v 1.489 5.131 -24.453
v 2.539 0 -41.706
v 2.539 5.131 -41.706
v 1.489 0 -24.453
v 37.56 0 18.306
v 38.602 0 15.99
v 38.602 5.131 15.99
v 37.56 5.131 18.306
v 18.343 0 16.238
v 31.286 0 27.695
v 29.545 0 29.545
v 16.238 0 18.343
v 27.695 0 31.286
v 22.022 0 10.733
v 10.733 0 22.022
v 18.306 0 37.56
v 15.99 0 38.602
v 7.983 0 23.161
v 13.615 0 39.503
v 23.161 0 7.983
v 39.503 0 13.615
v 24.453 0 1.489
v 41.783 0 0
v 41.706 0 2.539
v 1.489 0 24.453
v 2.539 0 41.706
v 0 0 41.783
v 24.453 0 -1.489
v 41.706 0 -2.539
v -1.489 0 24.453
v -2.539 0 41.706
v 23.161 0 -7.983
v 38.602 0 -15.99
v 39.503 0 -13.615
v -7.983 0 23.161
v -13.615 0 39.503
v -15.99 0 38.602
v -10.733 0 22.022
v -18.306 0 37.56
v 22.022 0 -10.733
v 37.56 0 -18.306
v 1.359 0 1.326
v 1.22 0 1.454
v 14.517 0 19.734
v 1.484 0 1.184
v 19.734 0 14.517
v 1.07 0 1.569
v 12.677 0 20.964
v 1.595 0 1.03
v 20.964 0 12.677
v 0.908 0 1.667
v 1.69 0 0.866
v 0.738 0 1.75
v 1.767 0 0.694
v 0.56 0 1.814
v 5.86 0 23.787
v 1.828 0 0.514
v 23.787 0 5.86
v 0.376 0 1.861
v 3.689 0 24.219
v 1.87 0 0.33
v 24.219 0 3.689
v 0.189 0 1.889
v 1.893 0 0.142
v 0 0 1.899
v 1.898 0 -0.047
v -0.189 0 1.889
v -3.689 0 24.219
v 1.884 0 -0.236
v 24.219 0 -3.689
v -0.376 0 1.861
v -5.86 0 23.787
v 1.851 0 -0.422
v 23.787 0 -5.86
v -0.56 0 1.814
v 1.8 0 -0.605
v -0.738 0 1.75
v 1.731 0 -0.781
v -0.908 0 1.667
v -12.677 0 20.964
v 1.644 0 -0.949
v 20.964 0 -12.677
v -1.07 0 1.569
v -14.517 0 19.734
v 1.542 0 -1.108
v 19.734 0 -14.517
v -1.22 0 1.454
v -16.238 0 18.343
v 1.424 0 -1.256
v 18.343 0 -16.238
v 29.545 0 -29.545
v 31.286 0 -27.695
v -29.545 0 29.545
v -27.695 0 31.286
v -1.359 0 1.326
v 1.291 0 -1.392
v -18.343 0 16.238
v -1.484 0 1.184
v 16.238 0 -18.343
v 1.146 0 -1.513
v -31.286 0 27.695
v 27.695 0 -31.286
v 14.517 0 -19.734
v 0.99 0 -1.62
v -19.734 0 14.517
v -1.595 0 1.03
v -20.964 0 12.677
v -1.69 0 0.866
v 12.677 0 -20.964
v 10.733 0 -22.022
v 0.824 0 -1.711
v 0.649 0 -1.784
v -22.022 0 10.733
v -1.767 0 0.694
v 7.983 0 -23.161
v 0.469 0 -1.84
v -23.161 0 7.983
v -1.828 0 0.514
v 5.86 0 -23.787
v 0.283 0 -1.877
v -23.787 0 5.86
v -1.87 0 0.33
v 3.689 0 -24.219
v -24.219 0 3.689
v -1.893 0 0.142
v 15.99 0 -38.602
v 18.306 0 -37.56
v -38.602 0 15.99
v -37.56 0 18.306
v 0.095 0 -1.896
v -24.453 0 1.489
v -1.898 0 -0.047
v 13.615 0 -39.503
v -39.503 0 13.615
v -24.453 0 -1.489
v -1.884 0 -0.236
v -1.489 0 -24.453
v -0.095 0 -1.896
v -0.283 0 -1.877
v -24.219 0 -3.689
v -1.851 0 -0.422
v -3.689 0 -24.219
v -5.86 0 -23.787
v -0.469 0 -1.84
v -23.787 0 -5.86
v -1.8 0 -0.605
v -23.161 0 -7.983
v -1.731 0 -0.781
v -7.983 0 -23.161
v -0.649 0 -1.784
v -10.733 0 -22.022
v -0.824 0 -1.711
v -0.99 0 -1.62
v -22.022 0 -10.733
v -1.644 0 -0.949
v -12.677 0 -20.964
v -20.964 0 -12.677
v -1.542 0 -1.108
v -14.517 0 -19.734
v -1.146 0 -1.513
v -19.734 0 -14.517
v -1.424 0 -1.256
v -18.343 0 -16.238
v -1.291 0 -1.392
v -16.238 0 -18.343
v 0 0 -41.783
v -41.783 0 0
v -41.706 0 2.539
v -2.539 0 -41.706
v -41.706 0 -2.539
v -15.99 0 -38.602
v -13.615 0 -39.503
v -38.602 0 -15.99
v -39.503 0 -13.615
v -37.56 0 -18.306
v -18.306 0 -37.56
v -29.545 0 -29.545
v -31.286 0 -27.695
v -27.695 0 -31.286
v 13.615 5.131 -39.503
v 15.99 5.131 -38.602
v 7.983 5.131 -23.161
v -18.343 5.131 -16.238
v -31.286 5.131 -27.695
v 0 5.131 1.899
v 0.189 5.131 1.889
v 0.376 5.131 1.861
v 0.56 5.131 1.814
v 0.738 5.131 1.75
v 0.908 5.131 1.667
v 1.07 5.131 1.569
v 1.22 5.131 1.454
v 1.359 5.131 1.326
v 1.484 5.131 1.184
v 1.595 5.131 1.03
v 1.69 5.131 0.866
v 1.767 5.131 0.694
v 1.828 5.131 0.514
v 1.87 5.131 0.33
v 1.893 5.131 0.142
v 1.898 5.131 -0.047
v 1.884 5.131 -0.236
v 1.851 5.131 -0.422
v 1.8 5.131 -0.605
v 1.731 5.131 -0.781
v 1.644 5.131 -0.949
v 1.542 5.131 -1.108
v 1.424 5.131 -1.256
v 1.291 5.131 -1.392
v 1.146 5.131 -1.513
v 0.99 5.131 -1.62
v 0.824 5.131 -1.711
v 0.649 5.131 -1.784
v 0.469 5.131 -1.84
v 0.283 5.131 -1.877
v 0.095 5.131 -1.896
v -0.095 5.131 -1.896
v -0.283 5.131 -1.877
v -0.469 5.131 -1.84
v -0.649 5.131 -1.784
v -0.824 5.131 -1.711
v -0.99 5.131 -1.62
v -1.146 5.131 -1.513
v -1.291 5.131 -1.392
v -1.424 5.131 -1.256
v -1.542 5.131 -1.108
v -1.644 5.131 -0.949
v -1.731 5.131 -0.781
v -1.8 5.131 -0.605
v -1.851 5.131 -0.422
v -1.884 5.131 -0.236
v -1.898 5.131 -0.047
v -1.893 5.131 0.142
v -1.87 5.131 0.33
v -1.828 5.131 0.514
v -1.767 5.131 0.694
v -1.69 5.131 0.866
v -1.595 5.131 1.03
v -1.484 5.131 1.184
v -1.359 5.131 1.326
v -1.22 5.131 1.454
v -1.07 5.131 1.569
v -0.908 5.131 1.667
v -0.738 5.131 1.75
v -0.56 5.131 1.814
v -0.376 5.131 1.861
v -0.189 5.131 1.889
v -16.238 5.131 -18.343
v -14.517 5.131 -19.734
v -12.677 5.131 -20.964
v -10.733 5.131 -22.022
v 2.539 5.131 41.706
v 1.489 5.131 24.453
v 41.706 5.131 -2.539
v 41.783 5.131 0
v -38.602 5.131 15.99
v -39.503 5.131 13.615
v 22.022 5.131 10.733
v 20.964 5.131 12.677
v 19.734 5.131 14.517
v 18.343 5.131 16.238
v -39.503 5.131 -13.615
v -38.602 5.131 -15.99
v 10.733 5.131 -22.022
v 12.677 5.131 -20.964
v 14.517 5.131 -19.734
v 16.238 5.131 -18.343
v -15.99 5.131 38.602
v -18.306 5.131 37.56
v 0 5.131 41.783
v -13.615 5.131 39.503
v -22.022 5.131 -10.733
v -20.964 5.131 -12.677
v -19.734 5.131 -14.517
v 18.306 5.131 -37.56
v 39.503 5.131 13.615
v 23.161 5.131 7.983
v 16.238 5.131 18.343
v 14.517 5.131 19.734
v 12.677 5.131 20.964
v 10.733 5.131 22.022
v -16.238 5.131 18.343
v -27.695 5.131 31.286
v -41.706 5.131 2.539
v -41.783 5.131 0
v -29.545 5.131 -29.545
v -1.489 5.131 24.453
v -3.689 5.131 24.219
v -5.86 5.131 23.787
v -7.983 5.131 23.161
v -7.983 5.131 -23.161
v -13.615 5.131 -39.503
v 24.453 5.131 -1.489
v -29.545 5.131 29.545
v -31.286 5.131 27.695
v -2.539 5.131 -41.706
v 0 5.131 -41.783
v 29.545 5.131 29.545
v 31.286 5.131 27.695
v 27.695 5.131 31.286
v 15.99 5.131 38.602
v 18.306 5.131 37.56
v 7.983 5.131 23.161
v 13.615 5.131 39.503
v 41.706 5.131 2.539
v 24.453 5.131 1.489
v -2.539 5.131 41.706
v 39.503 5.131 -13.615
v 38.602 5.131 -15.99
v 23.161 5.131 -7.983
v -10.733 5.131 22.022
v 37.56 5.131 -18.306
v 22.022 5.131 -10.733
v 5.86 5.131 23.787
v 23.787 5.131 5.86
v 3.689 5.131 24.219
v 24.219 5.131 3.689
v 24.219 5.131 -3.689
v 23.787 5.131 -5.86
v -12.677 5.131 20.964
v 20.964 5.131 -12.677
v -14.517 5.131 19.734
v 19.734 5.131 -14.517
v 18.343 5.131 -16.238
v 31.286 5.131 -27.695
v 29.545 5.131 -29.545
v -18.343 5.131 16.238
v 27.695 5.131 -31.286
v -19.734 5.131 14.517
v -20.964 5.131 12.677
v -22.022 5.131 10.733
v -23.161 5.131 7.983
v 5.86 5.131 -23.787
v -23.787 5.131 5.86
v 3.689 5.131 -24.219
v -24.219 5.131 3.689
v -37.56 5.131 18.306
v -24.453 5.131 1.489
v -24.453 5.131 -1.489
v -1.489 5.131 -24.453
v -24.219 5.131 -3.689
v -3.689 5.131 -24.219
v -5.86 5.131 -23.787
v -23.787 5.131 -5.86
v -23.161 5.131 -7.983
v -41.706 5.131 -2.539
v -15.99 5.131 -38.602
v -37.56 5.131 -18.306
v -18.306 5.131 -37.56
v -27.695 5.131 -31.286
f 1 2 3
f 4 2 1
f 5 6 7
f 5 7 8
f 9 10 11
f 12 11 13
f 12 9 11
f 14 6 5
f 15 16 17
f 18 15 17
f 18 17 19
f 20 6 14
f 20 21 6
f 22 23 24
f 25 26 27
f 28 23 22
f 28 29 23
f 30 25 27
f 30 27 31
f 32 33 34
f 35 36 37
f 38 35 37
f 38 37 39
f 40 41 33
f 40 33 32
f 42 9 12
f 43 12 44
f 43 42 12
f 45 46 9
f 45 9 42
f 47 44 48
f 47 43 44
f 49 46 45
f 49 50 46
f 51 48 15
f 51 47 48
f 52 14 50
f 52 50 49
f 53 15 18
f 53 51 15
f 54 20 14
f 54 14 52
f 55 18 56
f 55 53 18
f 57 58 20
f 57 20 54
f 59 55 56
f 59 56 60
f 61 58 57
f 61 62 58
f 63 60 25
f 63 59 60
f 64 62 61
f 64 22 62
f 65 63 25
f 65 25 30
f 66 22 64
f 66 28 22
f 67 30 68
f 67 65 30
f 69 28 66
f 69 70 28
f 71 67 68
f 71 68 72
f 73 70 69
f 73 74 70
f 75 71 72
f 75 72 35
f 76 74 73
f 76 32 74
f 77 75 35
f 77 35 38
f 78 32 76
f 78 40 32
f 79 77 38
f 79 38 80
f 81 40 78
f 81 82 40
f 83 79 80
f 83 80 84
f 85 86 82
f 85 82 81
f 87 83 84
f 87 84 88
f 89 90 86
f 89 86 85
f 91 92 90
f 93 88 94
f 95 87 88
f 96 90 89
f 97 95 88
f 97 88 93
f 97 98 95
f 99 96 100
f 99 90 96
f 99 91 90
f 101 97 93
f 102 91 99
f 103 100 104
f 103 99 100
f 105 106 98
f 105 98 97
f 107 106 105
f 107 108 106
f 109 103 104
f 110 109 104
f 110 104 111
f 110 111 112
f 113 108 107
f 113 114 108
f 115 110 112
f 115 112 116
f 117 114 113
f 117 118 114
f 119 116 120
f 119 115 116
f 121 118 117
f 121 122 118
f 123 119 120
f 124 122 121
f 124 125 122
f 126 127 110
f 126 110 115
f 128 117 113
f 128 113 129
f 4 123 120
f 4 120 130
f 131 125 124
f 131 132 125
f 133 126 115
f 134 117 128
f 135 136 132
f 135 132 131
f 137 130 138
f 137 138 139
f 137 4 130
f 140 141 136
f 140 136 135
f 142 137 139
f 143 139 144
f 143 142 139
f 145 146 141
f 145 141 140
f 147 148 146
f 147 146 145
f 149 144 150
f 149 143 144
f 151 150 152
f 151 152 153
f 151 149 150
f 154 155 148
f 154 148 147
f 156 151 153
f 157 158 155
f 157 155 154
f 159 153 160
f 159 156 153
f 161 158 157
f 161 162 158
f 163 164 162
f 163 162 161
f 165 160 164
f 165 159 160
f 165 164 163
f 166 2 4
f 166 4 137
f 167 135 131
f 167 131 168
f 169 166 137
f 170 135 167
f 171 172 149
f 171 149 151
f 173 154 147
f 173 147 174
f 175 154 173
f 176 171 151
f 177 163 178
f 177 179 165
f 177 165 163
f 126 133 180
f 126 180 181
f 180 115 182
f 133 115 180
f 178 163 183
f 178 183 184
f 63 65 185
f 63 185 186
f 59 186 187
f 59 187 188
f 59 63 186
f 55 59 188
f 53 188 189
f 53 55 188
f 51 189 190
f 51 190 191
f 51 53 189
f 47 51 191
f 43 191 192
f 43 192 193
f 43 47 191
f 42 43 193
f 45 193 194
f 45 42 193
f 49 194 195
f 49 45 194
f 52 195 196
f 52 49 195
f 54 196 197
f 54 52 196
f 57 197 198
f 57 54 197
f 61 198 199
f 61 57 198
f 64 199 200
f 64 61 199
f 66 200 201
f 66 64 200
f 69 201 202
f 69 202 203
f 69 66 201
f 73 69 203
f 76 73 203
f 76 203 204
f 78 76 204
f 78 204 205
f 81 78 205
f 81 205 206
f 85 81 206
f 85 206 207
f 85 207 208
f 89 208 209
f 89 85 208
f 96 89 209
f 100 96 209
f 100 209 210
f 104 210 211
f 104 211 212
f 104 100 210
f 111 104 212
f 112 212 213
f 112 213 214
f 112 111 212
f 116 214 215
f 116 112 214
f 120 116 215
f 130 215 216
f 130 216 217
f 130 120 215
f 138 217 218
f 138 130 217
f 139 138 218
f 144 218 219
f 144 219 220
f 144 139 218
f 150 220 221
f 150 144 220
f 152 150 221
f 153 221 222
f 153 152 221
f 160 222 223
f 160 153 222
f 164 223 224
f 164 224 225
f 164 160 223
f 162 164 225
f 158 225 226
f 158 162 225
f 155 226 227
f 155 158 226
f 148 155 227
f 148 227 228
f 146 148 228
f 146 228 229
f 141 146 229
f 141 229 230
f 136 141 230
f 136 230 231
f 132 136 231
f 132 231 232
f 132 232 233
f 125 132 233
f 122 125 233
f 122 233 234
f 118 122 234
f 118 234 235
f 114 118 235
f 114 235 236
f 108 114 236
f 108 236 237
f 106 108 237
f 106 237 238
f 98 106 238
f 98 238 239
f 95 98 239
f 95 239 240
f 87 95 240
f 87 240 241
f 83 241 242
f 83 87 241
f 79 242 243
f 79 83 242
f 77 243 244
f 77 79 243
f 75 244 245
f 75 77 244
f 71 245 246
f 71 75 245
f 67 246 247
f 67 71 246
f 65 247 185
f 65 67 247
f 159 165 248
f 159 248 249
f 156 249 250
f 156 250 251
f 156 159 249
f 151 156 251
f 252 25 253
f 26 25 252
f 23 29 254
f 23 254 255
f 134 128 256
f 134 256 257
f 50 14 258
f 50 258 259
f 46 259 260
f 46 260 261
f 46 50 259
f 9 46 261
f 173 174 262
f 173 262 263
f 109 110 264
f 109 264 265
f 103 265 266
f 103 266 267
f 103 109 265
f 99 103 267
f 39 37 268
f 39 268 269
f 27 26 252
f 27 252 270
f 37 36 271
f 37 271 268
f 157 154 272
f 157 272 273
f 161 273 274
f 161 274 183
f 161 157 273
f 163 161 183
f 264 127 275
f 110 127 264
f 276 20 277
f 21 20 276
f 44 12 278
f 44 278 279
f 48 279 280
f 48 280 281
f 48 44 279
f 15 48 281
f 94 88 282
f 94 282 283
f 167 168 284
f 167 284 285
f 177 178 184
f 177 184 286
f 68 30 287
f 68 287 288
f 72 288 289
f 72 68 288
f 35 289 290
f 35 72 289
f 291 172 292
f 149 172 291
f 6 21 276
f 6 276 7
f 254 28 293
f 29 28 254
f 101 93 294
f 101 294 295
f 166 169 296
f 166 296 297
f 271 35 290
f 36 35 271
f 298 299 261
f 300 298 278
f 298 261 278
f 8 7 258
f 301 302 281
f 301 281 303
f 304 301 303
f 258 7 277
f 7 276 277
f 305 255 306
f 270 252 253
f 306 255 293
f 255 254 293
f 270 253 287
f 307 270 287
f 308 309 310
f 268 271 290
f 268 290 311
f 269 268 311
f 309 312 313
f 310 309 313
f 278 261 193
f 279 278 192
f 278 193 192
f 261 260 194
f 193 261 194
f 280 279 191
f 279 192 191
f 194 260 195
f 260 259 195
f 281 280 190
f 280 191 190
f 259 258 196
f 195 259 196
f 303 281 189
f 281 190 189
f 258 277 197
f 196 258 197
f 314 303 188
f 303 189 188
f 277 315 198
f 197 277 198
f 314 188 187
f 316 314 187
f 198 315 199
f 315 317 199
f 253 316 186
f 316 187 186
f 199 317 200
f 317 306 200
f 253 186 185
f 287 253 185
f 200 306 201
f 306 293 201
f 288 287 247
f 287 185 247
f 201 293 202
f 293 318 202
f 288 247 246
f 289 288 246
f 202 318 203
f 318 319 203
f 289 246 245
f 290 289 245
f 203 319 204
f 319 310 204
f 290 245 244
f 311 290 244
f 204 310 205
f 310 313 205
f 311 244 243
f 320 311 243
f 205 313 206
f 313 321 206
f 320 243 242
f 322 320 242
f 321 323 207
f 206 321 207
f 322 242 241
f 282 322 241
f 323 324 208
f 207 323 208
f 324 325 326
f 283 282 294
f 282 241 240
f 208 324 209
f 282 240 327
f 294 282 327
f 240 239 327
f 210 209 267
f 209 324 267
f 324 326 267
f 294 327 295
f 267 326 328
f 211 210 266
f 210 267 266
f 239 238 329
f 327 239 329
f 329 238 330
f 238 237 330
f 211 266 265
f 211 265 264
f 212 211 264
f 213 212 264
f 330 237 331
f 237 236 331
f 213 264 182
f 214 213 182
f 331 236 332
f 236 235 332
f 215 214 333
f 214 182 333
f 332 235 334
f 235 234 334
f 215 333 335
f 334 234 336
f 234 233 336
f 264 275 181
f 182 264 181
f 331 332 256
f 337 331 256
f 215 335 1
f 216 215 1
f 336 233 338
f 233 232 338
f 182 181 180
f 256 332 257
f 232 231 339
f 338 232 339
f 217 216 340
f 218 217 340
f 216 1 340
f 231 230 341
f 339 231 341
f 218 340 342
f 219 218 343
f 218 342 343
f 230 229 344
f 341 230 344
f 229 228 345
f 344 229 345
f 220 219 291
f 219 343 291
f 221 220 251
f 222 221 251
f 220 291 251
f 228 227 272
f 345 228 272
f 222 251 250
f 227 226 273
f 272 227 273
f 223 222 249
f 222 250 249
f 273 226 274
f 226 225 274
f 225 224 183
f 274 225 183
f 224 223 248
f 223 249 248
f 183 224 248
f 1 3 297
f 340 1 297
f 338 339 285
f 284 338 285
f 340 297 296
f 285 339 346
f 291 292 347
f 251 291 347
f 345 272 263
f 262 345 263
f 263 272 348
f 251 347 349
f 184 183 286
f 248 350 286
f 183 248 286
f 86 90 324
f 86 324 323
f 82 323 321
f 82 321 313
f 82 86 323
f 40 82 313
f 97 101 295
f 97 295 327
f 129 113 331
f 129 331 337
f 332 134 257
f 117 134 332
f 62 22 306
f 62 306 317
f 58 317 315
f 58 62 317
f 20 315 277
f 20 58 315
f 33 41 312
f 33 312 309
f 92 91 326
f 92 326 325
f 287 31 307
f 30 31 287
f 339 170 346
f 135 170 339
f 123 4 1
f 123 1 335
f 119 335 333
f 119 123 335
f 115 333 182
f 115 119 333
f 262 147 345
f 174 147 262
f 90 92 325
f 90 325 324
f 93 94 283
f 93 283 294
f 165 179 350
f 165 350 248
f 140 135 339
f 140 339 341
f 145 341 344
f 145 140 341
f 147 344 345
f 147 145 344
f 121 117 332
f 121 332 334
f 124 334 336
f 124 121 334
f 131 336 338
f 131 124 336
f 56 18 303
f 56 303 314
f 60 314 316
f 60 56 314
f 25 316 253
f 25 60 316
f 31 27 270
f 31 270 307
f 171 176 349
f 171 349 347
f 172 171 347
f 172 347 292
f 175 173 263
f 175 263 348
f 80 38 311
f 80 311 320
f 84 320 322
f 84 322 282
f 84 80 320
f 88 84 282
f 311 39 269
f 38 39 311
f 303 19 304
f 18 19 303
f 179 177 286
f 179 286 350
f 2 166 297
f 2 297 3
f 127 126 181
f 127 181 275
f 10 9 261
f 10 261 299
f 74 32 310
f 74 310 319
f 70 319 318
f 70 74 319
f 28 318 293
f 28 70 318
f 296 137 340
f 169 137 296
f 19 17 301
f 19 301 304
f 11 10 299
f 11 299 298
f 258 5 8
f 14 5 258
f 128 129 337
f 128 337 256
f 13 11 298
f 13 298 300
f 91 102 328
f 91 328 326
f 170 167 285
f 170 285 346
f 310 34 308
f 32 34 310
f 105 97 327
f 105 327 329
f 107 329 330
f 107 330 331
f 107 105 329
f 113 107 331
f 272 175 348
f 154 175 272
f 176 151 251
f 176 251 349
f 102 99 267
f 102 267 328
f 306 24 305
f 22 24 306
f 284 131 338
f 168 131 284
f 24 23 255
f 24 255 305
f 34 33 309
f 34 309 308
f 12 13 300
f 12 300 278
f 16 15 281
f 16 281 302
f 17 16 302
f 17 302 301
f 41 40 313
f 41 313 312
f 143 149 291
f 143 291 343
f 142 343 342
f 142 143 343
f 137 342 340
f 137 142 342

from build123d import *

# Parameters (mm, degrees)
SKETCH2_R           = 1.89865
BOSS_EXTRUDE1_DEPTH = 5.1308


with BuildPart() as part:
    # Sketch2 → Boss-Extrude1 (new body)
    with BuildSketch(Plane(origin=(0, 0, 0), x_dir=(1, 0, 0), z_dir=(0, 1, 0))):
        with BuildLine():
            Line((-13.614547531, 39.502698446), (-15.989661855, 38.602458507))
            Line((-15.989661855, 38.602458507), (-18.305687065, 37.559564828))
            Line((-18.305687065, 37.559564828), (-10.733030501, 22.022006247))
            ThreePointArc((-10.733030501, 22.022006247), (-13.61052624, 20.369592003), (-16.238327885, 18.34348414))
            Line((-16.238327885, 18.34348414), (-27.695230037, 31.285672794))
            Line((-27.695230037, 31.285672794), (-29.545042638, 29.545042638))
            Line((-29.545042638, 29.545042638), (-31.285672794, 27.695230037))
            Line((-31.285672794, 27.695230037), (-18.34348414, 16.238327885))
            ThreePointArc((-18.34348414, 16.238327885), (-20.369592003, 13.61052624), (-22.022006247, 10.733030501))
            Line((-22.022006247, 10.733030501), (-37.559564828, 18.305687065))
            Line((-37.559564828, 18.305687065), (-38.602458507, 15.989661855))
            Line((-38.602458507, 15.989661855), (-39.502698446, 13.614547531))
            Line((-39.502698446, 13.614547531), (-23.161308603, 7.982511303))
            ThreePointArc((-23.161308603, 7.982511303), (-24.027572035, 4.779381236), (-24.453033788, 1.488570263))
            Line((-24.453033788, 1.488570263), (-41.705796353, 2.538826421))
            Line((-41.705796353, 2.538826421), (-41.783, 0))
            Line((-41.783, 0), (-41.705796353, -2.538826421))
            Line((-41.705796353, -2.538826421), (-24.453033788, -1.488570263))
            ThreePointArc((-24.453033788, -1.488570263), (-24.027572035, -4.779381236), (-23.161308603, -7.982511303))
            Line((-23.161308603, -7.982511303), (-39.502698446, -13.614547531))
            Line((-39.502698446, -13.614547531), (-38.602458507, -15.989661855))
            Line((-38.602458507, -15.989661855), (-37.559564828, -18.305687065))
            Line((-37.559564828, -18.305687065), (-22.022006247, -10.733030501))
            ThreePointArc((-22.022006247, -10.733030501), (-20.369592003, -13.61052624), (-18.34348414, -16.238327885))
            Line((-18.34348414, -16.238327885), (-31.285672794, -27.695230037))
            Line((-31.285672794, -27.695230037), (-29.545042638, -29.545042638))
            Line((-29.545042638, -29.545042638), (-27.695230037, -31.285672794))
            Line((-27.695230037, -31.285672794), (-16.238327885, -18.34348414))
            ThreePointArc((-16.238327885, -18.34348414), (-13.61052624, -20.369592003), (-10.733030501, -22.022006247))
            Line((-10.733030501, -22.022006247), (-18.305687065, -37.559564828))
            Line((-18.305687065, -37.559564828), (-15.989661855, -38.602458507))
            Line((-15.989661855, -38.602458507), (-13.614547531, -39.502698446))
            Line((-13.614547531, -39.502698446), (-7.982511303, -23.161308603))
            ThreePointArc((-7.982511303, -23.161308603), (-4.779381236, -24.027572035), (-1.488570263, -24.453033788))
            Line((-1.488570263, -24.453033788), (-2.538826421, -41.705796353))
            Line((-2.538826421, -41.705796353), (0, -41.783))
            Line((0, -41.783), (2.538826421, -41.705796353))
            Line((2.538826421, -41.705796353), (1.488570263, -24.453033788))
            ThreePointArc((1.488570263, -24.453033788), (4.779381236, -24.027572035), (7.982511303, -23.161308603))
            Line((7.982511303, -23.161308603), (13.614547531, -39.502698446))
            Line((13.614547531, -39.502698446), (15.989661855, -38.602458507))
            Line((15.989661855, -38.602458507), (18.305687065, -37.559564828))
            Line((18.305687065, -37.559564828), (10.733030501, -22.022006247))
            ThreePointArc((10.733030501, -22.022006247), (13.61052624, -20.369592003), (16.238327885, -18.34348414))
            Line((16.238327885, -18.34348414), (27.695230037, -31.285672794))
            Line((27.695230037, -31.285672794), (29.545042638, -29.545042638))
            Line((29.545042638, -29.545042638), (31.285672794, -27.695230037))
            Line((31.285672794, -27.695230037), (18.34348414, -16.238327885))
            ThreePointArc((18.34348414, -16.238327885), (20.369592003, -13.61052624), (22.022006247, -10.733030501))
            Line((22.022006247, -10.733030501), (37.559564828, -18.305687065))
            Line((37.559564828, -18.305687065), (38.602458507, -15.989661855))
            Line((38.602458507, -15.989661855), (39.502698446, -13.614547531))
            Line((39.502698446, -13.614547531), (23.161308603, -7.982511303))
            ThreePointArc((23.161308603, -7.982511303), (24.027572035, -4.779381236), (24.453033788, -1.488570263))
            Line((24.453033788, -1.488570263), (41.705796353, -2.538826421))
            Line((41.705796353, -2.538826421), (41.783, 0))
            Line((41.783, 0), (41.705796353, 2.538826421))
            Line((41.705796353, 2.538826421), (24.453033788, 1.488570263))
            ThreePointArc((24.453033788, 1.488570263), (24.027572035, 4.779381236), (23.161308603, 7.982511303))
            Line((23.161308603, 7.982511303), (39.502698446, 13.614547531))
            Line((39.502698446, 13.614547531), (38.602458507, 15.989661855))
            Line((38.602458507, 15.989661855), (37.559564828, 18.305687065))
            Line((37.559564828, 18.305687065), (22.022006247, 10.733030501))
            ThreePointArc((22.022006247, 10.733030501), (20.369592003, 13.61052624), (18.34348414, 16.238327885))
            Line((18.34348414, 16.238327885), (31.285672794, 27.695230037))
            Line((31.285672794, 27.695230037), (29.545042638, 29.545042638))
            Line((29.545042638, 29.545042638), (27.695230037, 31.285672794))
            Line((27.695230037, 31.285672794), (16.238327885, 18.34348414))
            ThreePointArc((16.238327885, 18.34348414), (13.61052624, 20.369592003), (10.733030501, 22.022006247))
            Line((10.733030501, 22.022006247), (18.305687065, 37.559564828))
            Line((18.305687065, 37.559564828), (15.989661855, 38.602458507))
            Line((15.989661855, 38.602458507), (13.614547531, 39.502698446))
            Line((13.614547531, 39.502698446), (7.982511303, 23.161308603))
            ThreePointArc((7.982511303, 23.161308603), (4.779381236, 24.027572035), (1.488570263, 24.453033788))
            Line((1.488570263, 24.453033788), (2.538826421, 41.705796353))
            Line((2.538826421, 41.705796353), (0, 41.783))
            Line((0, 41.783), (-2.538826421, 41.705796353))
            Line((-2.538826421, 41.705796353), (-1.488570263, 24.453033788))
            ThreePointArc((-1.488570263, 24.453033788), (-4.779381236, 24.027572035), (-7.982511303, 23.161308603))
            Line((-7.982511303, 23.161308603), (-13.614547531, 39.502698446))
        make_face()
        Circle(SKETCH2_R, mode=Mode.SUBTRACT)
    extrude(amount=BOSS_EXTRUDE1_DEPTH)


solid = part.part
